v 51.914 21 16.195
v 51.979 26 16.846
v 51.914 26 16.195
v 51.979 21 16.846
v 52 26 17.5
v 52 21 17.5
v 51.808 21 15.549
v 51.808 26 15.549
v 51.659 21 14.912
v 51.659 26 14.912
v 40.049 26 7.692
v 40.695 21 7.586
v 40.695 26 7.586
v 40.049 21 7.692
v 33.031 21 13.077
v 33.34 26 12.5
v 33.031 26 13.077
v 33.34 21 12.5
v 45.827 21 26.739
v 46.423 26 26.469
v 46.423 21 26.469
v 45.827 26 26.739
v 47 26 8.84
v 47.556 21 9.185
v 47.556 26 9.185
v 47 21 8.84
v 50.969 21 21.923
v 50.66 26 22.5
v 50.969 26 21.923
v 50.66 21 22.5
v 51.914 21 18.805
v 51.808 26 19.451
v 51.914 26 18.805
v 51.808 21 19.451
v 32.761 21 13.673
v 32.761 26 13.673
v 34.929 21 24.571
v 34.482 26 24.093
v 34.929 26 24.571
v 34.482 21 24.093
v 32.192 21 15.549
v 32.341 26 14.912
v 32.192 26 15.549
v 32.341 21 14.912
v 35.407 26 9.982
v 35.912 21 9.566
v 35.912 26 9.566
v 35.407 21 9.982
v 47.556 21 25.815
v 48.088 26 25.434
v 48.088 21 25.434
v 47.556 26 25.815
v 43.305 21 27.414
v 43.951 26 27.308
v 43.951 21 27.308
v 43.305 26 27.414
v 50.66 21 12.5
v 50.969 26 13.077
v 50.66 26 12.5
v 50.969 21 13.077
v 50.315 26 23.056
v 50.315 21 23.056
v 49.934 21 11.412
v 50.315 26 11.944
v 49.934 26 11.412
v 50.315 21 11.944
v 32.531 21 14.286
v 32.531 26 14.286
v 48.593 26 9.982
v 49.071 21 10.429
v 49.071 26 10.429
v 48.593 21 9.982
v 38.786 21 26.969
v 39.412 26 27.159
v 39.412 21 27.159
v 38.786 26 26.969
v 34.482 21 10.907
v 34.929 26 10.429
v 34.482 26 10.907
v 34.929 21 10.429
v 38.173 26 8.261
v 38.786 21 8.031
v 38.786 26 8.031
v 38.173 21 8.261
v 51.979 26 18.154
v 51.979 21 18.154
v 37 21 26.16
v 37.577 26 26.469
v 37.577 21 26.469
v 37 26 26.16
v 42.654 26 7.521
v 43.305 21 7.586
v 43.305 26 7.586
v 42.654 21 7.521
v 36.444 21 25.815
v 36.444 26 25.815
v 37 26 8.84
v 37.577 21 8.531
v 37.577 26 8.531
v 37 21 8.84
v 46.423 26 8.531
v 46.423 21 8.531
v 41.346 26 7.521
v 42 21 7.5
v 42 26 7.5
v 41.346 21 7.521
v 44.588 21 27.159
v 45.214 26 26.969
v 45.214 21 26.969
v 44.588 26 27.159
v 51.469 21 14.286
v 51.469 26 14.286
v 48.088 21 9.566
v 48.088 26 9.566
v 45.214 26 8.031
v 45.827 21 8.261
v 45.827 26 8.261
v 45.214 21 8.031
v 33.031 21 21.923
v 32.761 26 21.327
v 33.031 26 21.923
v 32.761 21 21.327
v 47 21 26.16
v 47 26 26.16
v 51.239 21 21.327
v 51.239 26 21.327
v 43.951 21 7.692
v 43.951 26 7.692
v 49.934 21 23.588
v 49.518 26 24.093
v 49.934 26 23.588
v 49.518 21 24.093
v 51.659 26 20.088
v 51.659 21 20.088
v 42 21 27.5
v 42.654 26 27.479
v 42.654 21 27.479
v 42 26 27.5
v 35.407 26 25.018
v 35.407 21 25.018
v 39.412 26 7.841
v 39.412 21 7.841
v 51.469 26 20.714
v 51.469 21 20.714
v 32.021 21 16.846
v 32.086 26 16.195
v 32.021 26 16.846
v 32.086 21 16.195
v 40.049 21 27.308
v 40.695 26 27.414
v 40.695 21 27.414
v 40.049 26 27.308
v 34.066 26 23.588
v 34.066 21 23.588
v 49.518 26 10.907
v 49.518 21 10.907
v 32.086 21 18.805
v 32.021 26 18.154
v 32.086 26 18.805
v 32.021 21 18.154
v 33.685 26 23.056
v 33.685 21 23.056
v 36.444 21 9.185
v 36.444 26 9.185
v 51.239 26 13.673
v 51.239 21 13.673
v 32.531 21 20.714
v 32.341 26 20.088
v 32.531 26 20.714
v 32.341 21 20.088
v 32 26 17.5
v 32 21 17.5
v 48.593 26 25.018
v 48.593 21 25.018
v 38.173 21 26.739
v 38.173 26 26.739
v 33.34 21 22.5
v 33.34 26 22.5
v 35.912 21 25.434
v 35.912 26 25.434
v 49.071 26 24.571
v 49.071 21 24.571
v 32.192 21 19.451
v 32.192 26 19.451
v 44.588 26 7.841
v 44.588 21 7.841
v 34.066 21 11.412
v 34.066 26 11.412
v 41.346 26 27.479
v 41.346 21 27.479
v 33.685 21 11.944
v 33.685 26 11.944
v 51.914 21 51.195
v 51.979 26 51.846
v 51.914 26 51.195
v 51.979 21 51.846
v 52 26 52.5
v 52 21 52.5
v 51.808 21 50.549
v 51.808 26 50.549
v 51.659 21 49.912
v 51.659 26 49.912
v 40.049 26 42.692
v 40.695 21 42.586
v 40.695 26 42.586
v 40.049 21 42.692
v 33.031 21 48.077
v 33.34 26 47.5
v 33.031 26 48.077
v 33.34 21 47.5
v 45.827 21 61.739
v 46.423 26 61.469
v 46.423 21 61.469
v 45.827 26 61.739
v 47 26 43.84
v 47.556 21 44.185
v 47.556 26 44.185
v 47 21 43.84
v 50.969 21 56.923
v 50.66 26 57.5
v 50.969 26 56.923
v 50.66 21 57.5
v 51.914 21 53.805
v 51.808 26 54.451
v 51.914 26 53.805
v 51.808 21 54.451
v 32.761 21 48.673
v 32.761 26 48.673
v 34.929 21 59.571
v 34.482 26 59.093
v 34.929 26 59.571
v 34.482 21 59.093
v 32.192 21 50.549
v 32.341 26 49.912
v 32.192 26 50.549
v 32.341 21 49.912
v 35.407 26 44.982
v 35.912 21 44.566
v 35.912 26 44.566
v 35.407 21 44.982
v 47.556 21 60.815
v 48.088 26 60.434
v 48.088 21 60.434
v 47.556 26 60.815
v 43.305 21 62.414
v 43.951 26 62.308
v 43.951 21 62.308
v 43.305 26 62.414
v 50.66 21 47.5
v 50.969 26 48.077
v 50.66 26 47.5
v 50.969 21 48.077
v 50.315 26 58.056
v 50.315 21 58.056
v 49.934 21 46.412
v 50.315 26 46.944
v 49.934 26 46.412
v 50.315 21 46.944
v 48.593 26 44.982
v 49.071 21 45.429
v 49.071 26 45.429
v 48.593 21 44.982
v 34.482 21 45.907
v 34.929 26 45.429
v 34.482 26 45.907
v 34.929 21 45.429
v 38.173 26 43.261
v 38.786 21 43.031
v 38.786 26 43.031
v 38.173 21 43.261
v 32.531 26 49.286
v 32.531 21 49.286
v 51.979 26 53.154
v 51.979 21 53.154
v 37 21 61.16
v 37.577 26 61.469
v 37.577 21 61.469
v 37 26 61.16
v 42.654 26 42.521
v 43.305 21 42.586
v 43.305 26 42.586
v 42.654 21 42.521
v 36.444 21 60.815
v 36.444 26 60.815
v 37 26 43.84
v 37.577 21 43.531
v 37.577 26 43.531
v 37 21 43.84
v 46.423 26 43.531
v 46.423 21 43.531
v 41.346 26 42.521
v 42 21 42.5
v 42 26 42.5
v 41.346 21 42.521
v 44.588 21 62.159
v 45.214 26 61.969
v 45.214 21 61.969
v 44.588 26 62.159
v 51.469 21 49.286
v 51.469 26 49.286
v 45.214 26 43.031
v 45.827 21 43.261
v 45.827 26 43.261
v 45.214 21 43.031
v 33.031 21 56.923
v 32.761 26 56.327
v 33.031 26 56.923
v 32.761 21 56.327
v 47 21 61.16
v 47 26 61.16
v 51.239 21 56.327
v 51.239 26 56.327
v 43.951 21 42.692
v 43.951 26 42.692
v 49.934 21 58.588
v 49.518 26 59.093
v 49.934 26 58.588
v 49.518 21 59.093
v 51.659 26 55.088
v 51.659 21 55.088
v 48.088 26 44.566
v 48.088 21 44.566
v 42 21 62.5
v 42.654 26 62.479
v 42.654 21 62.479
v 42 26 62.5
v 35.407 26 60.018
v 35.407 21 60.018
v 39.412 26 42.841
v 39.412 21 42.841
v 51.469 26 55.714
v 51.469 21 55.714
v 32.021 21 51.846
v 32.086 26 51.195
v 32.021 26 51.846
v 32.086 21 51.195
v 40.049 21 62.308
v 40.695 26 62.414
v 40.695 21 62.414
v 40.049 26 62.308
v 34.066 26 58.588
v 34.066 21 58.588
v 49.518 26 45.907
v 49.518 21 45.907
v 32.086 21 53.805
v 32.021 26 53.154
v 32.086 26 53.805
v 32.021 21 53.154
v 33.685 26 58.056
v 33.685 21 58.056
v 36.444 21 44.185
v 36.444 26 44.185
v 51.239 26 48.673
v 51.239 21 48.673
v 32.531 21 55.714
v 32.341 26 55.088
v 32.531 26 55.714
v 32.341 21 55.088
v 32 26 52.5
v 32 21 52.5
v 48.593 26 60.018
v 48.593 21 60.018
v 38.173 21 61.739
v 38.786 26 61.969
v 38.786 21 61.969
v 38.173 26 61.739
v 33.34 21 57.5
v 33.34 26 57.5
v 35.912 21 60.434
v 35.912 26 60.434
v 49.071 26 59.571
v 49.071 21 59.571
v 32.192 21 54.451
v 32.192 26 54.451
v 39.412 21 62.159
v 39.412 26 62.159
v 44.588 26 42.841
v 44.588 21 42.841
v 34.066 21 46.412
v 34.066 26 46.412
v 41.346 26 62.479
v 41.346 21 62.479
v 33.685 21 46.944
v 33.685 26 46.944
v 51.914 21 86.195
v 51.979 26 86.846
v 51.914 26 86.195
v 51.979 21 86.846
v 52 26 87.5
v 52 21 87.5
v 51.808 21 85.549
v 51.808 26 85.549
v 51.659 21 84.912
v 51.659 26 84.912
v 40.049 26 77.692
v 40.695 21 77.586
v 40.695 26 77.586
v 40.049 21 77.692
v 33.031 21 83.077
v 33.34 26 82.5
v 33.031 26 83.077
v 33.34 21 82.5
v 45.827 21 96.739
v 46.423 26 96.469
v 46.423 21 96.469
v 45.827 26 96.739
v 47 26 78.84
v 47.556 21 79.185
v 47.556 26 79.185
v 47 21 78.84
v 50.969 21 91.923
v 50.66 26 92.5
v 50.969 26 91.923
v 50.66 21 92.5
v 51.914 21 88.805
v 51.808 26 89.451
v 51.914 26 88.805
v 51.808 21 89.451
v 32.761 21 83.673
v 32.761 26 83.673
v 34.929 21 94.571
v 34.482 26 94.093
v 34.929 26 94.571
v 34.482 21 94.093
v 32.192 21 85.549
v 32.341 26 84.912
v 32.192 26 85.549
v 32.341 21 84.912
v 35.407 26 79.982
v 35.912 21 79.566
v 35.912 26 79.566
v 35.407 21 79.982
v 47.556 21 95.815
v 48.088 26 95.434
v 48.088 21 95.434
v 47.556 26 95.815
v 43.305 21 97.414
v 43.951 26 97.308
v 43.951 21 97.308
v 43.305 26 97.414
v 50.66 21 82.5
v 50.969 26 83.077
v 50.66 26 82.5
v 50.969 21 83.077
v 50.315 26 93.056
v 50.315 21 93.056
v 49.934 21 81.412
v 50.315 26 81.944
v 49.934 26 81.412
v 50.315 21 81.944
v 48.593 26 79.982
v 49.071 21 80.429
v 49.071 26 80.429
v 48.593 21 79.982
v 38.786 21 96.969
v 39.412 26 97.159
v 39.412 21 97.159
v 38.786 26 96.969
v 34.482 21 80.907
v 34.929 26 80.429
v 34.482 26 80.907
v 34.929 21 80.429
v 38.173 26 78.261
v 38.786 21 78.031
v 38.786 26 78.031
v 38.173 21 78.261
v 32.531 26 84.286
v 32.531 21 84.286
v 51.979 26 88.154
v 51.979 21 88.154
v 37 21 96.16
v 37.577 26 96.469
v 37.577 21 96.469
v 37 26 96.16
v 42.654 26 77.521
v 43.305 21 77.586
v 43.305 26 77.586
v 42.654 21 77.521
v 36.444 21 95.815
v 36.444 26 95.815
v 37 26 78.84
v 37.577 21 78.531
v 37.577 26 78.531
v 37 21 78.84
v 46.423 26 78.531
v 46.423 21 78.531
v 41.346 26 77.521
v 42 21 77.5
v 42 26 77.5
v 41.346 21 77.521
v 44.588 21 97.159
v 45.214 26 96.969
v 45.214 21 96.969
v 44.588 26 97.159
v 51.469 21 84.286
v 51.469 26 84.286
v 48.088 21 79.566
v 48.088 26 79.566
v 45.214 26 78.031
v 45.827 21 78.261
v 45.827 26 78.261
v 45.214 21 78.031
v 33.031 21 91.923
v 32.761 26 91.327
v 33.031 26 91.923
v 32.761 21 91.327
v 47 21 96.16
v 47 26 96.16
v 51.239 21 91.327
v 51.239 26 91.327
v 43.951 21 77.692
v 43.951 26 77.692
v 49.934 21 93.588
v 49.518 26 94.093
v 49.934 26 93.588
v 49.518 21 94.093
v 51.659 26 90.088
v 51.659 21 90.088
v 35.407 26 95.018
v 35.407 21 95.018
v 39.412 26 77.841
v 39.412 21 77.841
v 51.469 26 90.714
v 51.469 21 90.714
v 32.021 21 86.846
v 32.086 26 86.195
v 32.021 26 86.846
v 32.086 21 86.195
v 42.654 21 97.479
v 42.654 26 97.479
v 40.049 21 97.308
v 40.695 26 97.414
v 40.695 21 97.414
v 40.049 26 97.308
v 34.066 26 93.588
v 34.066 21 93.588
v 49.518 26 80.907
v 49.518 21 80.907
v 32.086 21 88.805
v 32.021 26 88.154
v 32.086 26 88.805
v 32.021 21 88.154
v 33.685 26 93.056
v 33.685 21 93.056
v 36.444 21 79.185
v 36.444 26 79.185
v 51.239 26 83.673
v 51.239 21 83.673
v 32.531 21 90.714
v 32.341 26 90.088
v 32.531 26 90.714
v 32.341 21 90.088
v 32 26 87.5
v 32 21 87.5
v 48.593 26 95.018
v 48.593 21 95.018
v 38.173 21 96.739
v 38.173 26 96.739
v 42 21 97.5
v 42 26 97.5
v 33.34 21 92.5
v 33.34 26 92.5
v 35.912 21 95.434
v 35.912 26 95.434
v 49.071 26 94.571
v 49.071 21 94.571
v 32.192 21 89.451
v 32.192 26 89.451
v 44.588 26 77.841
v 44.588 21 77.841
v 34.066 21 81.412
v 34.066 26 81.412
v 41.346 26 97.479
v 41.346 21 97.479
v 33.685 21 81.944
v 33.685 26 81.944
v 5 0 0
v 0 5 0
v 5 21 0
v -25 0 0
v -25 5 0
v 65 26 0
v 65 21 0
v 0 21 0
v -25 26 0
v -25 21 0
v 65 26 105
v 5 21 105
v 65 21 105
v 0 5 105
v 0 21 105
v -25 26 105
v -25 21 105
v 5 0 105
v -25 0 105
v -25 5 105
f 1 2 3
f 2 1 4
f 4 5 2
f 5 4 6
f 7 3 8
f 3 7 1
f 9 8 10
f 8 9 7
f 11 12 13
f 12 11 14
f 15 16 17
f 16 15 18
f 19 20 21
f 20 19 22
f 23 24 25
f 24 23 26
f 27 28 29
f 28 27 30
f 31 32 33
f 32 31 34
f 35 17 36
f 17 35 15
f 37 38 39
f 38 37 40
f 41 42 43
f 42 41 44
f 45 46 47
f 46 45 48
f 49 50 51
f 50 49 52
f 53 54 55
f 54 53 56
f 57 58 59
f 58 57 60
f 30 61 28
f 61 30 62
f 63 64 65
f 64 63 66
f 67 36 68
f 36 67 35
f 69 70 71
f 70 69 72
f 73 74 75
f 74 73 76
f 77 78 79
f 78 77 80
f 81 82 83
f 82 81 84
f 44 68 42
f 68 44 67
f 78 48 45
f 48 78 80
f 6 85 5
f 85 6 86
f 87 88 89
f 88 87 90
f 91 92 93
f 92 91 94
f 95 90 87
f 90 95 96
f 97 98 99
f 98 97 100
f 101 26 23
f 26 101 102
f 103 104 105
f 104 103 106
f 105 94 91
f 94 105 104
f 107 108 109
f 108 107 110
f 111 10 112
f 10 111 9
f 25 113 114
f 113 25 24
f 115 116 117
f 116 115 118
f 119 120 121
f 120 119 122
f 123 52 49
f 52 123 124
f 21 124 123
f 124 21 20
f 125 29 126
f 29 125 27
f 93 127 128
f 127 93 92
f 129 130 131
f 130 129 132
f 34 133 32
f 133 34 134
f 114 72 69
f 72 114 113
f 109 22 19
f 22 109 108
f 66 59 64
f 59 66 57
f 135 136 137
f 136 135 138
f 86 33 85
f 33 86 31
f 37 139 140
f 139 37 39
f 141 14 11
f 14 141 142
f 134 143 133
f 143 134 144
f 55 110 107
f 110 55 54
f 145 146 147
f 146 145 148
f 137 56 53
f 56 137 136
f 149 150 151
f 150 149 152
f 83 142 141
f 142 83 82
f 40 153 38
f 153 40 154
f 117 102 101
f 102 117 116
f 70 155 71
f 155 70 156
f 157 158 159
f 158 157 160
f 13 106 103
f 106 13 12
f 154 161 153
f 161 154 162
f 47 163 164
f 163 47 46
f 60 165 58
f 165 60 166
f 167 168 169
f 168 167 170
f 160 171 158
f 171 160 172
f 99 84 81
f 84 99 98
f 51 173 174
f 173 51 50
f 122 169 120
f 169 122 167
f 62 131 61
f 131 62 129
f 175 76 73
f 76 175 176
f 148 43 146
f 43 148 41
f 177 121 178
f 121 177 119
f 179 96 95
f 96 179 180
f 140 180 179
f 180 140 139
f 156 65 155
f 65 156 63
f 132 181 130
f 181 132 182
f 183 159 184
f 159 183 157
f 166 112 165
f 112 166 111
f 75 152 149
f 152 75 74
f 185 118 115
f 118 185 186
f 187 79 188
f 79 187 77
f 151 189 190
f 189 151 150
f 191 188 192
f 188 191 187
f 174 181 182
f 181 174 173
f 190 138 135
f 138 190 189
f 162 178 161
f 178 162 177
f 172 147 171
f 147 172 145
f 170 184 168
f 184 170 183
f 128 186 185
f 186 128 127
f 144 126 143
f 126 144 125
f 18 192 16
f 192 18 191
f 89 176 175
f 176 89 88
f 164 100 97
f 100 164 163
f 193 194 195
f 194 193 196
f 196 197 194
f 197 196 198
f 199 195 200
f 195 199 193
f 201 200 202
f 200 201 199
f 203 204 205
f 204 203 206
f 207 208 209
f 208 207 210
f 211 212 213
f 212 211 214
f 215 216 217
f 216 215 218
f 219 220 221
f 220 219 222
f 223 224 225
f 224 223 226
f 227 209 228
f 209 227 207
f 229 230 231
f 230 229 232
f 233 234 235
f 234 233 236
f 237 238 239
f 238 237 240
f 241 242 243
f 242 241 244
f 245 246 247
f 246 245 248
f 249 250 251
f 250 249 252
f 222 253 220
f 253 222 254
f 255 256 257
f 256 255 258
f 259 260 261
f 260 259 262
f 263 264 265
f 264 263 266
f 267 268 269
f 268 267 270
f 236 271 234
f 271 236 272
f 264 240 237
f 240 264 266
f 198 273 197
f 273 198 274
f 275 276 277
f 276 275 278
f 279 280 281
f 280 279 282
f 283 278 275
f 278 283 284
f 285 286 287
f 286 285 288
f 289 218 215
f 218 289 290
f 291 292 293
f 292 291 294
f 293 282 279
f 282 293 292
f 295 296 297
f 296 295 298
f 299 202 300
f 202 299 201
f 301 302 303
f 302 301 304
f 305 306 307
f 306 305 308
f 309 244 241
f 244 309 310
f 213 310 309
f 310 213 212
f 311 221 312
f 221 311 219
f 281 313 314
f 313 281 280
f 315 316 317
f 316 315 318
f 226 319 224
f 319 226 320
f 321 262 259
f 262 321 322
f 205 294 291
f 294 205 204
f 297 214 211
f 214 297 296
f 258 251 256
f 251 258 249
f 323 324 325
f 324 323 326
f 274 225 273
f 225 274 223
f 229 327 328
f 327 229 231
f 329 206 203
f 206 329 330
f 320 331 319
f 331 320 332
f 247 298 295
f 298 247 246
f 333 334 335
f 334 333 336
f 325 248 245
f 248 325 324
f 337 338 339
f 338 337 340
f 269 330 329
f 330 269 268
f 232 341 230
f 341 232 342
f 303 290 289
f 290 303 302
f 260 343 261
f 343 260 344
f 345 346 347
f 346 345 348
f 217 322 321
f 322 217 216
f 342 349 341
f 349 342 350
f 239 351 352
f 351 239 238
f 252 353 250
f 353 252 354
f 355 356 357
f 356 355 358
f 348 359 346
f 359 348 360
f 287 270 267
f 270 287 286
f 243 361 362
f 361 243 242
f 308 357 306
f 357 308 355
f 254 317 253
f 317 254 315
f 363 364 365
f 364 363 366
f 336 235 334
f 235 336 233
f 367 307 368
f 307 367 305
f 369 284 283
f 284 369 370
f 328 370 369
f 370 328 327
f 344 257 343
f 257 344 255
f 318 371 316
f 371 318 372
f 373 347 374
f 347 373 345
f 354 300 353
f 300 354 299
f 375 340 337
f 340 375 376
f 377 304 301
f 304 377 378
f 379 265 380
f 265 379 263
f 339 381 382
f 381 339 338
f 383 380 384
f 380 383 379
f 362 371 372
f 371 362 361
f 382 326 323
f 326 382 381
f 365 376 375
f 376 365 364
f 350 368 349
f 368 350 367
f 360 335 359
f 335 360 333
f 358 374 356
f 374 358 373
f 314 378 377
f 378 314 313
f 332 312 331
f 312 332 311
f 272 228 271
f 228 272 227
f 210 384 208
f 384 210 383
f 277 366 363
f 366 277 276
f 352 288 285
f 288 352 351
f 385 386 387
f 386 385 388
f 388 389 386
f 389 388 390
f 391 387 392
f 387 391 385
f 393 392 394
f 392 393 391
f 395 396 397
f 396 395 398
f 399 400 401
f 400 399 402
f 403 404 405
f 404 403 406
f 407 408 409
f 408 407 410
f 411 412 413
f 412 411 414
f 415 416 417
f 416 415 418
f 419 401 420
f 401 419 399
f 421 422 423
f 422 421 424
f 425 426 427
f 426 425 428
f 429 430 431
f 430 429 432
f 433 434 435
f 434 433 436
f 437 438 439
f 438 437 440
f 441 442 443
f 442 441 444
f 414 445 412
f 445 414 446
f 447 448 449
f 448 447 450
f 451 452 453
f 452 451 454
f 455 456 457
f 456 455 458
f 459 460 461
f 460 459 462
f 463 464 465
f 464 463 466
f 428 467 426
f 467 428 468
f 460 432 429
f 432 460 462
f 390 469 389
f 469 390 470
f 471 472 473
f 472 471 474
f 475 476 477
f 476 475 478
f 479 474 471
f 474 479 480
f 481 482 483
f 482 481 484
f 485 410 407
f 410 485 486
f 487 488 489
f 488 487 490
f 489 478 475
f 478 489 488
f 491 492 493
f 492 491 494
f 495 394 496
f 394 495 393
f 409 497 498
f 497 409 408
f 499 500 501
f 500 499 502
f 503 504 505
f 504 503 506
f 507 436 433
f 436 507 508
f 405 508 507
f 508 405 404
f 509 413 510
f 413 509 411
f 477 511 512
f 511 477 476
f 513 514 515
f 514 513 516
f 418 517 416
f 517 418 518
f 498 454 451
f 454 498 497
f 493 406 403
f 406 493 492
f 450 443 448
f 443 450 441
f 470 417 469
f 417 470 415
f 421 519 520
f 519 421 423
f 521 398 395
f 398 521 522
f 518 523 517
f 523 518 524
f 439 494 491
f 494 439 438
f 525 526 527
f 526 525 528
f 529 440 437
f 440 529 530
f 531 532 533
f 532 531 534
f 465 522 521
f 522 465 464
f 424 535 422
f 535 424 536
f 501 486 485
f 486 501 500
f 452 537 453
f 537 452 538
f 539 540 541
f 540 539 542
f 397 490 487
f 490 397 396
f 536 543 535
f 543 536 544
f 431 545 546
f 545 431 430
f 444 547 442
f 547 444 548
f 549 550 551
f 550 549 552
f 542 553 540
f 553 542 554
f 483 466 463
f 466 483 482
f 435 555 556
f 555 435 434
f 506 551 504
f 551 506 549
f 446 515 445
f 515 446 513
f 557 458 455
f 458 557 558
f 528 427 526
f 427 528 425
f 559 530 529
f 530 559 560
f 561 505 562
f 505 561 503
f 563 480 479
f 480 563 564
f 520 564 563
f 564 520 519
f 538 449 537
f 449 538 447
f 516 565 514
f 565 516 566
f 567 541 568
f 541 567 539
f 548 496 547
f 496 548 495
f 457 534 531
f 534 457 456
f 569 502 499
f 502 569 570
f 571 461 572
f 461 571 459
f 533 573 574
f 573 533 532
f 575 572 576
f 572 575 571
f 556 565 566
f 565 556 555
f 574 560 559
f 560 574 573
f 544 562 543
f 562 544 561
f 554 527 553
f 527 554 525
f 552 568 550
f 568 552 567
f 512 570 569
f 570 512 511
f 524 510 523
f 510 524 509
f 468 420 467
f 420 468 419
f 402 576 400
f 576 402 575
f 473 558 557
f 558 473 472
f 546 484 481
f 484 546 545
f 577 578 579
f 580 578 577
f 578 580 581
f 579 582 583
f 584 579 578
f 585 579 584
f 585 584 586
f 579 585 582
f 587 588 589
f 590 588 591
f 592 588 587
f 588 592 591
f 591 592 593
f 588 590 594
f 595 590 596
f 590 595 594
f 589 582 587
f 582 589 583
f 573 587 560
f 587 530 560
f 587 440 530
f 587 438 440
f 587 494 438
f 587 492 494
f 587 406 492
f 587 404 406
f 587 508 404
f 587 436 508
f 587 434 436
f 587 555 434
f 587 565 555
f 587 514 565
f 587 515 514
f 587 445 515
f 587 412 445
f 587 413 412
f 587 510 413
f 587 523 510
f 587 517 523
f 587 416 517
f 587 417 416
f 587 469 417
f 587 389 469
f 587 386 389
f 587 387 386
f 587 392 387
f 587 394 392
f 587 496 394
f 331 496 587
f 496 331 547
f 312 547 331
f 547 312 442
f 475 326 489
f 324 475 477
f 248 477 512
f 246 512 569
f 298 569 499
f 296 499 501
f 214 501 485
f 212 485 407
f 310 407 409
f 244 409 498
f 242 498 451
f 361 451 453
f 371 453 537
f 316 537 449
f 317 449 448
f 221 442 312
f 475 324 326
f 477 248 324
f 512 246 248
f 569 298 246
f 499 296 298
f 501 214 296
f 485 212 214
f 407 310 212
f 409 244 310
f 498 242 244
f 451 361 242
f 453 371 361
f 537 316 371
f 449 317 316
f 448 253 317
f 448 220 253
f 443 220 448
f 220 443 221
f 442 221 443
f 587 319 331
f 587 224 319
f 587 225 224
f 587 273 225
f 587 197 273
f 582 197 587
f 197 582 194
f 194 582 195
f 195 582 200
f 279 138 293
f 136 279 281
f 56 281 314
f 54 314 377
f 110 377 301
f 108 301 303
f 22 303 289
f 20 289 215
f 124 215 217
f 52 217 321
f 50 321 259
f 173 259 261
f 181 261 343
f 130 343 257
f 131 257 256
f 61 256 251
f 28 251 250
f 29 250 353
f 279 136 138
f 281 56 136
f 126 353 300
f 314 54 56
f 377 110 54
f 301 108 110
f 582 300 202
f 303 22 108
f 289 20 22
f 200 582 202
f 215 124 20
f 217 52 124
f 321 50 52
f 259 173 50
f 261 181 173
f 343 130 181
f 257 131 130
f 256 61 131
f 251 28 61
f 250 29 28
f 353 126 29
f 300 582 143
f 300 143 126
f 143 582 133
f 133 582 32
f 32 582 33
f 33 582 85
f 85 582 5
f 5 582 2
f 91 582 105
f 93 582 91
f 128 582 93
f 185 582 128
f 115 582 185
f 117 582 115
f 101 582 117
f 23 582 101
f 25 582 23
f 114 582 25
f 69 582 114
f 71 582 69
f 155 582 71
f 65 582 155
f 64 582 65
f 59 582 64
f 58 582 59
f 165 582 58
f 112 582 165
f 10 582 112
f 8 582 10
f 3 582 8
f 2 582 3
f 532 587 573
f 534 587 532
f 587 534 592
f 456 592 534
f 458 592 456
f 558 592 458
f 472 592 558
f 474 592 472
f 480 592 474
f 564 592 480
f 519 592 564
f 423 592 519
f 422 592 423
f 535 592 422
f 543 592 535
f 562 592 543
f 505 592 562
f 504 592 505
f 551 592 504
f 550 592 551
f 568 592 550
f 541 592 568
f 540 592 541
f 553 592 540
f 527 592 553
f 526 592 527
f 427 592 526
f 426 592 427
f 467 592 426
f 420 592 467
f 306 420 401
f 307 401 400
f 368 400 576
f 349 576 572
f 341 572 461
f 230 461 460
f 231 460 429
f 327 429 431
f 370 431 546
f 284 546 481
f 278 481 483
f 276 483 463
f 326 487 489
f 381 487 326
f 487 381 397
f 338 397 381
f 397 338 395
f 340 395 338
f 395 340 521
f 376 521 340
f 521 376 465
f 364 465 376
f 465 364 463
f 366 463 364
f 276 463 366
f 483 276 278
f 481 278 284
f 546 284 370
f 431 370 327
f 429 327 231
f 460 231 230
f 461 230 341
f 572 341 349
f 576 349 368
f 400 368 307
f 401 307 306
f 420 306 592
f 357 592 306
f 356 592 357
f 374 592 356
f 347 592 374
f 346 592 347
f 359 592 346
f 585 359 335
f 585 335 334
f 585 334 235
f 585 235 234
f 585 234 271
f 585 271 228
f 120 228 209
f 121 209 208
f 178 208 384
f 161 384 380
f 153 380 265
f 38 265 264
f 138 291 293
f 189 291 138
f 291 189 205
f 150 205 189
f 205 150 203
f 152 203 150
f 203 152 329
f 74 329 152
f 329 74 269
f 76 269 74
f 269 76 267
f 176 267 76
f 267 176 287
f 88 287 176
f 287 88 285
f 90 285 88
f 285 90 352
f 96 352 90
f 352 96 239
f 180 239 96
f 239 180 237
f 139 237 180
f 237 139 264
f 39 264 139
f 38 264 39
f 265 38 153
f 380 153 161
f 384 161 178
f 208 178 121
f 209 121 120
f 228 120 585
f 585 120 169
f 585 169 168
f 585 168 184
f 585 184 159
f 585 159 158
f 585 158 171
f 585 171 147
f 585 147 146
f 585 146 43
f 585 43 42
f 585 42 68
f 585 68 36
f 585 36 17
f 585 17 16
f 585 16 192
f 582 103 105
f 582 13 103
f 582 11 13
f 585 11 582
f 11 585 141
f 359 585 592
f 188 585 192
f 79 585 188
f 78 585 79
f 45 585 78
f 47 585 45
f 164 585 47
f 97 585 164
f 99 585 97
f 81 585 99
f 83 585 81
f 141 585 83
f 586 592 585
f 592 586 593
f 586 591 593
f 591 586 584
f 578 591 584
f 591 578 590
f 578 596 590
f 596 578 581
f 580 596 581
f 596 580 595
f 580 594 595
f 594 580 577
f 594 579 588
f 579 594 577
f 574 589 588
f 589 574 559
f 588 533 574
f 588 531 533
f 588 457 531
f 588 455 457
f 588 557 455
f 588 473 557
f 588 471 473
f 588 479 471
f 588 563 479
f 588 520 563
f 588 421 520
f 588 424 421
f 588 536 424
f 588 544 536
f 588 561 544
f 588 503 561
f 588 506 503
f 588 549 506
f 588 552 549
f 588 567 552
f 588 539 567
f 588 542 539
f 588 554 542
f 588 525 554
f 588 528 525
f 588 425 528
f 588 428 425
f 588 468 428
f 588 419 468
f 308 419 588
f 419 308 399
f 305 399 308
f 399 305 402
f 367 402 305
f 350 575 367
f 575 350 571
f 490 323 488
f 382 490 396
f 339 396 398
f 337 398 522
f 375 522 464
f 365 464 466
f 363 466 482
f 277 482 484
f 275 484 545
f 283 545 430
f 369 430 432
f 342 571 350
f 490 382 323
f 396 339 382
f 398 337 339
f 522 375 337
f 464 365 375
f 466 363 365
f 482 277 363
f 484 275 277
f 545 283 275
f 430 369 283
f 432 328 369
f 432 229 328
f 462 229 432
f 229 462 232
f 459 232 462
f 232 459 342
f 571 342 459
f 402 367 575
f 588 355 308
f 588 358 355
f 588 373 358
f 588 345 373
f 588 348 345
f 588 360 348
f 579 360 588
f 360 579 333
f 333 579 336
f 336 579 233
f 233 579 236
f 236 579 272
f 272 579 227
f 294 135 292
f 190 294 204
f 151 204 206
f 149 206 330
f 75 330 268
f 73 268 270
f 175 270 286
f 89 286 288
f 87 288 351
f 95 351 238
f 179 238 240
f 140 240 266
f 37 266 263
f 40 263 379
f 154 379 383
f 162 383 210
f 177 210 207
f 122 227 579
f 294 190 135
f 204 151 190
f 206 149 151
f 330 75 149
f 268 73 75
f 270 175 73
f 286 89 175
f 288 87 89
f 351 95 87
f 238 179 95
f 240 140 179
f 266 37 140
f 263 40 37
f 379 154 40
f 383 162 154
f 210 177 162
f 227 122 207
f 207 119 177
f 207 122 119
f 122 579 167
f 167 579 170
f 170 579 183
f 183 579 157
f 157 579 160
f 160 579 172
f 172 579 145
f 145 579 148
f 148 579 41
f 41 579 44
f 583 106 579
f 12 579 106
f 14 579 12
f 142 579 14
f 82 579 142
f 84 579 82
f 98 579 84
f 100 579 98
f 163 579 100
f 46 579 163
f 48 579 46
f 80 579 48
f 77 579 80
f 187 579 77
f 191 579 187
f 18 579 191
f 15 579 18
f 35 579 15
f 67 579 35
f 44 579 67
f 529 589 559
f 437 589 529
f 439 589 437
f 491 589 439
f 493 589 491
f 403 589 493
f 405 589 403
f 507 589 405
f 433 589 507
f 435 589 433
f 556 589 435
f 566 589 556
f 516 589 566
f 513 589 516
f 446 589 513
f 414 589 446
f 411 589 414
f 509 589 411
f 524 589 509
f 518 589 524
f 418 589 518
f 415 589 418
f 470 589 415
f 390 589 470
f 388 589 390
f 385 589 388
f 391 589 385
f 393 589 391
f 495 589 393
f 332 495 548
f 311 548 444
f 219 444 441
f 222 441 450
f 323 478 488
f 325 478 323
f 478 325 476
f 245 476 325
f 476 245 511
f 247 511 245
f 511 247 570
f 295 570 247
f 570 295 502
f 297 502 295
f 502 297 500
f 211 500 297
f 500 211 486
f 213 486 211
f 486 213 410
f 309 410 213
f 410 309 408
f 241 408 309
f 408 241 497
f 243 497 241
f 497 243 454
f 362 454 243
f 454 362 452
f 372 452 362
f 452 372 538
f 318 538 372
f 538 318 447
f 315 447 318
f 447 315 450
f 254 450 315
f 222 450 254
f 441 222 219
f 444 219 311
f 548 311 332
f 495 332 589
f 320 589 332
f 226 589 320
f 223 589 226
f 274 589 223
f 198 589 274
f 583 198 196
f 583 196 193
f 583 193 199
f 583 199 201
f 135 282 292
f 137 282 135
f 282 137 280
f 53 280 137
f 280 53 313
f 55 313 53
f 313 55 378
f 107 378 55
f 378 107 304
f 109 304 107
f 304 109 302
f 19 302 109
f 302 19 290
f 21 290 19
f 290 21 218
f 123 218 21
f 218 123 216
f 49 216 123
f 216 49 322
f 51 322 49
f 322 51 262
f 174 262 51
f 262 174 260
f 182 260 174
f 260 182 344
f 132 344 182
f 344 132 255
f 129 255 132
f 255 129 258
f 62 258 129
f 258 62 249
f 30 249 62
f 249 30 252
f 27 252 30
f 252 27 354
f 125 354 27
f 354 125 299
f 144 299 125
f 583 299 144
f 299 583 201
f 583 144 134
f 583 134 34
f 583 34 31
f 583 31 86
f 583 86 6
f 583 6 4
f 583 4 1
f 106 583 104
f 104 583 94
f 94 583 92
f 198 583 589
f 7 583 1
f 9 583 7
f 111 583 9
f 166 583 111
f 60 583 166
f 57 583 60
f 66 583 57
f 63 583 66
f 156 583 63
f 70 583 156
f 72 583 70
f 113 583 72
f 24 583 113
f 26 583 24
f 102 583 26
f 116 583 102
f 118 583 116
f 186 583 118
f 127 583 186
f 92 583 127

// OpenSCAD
// KNOWN-WRONG PART (must fail): the jaw gap is 16 mm (a thinner shelf)
// Holder for 3 single-channel pipettes that clamps onto the front edge of an 18 mm shelf
// Category: quick fixes. A C-shaped clamp (spine, bottom jaw, top jaw) whose top jaw continues
// forward as an arm with three 20 mm holes; each pipette drops in and hangs by its handle.
// Modelled in print orientation: lying on its side, the profile in XY extruded along Z
// (in use +Y is up and +X points away from the shelf), so the jaws print as plain walls.
// Print: PETG (springier than PLA), 0.2 mm layers, 4 perimeters.
// SPDX-License-Identifier: CERN-OHL-P-2.0

/* [Holder] */
width = 105;              // extrusion length (along the shelf edge)
spine = [0, 5];           // x from, x to
jaw_back = -25;           // both jaws reach back to x = -25
jaw_t = 5;
gap = 16;                 // 18 mm shelf + clearance
arm_front = 65;           // the top jaw continues forward to x = 65
hole_d = 20;
hole_x = 42;
hole_z = [17.5, 52.5, 87.5];

/* [Hidden] */
eps = 0.01;
H = jaw_t + gap + jaw_t;  // 28.4

difference() {
    linear_extrude(width) union() {
        translate([spine[0], 0]) square([spine[1] - spine[0], H]);
        translate([jaw_back, 0]) square([spine[1] - jaw_back, jaw_t]);
        translate([jaw_back, H - jaw_t]) square([arm_front - jaw_back, jaw_t]);
    }
    for (z = hole_z)
        translate([hole_x, H - jaw_t - 1, z]) rotate([-90, 0, 0]) cylinder(d = hole_d, h = jaw_t + 2, $fn = 96);
}
